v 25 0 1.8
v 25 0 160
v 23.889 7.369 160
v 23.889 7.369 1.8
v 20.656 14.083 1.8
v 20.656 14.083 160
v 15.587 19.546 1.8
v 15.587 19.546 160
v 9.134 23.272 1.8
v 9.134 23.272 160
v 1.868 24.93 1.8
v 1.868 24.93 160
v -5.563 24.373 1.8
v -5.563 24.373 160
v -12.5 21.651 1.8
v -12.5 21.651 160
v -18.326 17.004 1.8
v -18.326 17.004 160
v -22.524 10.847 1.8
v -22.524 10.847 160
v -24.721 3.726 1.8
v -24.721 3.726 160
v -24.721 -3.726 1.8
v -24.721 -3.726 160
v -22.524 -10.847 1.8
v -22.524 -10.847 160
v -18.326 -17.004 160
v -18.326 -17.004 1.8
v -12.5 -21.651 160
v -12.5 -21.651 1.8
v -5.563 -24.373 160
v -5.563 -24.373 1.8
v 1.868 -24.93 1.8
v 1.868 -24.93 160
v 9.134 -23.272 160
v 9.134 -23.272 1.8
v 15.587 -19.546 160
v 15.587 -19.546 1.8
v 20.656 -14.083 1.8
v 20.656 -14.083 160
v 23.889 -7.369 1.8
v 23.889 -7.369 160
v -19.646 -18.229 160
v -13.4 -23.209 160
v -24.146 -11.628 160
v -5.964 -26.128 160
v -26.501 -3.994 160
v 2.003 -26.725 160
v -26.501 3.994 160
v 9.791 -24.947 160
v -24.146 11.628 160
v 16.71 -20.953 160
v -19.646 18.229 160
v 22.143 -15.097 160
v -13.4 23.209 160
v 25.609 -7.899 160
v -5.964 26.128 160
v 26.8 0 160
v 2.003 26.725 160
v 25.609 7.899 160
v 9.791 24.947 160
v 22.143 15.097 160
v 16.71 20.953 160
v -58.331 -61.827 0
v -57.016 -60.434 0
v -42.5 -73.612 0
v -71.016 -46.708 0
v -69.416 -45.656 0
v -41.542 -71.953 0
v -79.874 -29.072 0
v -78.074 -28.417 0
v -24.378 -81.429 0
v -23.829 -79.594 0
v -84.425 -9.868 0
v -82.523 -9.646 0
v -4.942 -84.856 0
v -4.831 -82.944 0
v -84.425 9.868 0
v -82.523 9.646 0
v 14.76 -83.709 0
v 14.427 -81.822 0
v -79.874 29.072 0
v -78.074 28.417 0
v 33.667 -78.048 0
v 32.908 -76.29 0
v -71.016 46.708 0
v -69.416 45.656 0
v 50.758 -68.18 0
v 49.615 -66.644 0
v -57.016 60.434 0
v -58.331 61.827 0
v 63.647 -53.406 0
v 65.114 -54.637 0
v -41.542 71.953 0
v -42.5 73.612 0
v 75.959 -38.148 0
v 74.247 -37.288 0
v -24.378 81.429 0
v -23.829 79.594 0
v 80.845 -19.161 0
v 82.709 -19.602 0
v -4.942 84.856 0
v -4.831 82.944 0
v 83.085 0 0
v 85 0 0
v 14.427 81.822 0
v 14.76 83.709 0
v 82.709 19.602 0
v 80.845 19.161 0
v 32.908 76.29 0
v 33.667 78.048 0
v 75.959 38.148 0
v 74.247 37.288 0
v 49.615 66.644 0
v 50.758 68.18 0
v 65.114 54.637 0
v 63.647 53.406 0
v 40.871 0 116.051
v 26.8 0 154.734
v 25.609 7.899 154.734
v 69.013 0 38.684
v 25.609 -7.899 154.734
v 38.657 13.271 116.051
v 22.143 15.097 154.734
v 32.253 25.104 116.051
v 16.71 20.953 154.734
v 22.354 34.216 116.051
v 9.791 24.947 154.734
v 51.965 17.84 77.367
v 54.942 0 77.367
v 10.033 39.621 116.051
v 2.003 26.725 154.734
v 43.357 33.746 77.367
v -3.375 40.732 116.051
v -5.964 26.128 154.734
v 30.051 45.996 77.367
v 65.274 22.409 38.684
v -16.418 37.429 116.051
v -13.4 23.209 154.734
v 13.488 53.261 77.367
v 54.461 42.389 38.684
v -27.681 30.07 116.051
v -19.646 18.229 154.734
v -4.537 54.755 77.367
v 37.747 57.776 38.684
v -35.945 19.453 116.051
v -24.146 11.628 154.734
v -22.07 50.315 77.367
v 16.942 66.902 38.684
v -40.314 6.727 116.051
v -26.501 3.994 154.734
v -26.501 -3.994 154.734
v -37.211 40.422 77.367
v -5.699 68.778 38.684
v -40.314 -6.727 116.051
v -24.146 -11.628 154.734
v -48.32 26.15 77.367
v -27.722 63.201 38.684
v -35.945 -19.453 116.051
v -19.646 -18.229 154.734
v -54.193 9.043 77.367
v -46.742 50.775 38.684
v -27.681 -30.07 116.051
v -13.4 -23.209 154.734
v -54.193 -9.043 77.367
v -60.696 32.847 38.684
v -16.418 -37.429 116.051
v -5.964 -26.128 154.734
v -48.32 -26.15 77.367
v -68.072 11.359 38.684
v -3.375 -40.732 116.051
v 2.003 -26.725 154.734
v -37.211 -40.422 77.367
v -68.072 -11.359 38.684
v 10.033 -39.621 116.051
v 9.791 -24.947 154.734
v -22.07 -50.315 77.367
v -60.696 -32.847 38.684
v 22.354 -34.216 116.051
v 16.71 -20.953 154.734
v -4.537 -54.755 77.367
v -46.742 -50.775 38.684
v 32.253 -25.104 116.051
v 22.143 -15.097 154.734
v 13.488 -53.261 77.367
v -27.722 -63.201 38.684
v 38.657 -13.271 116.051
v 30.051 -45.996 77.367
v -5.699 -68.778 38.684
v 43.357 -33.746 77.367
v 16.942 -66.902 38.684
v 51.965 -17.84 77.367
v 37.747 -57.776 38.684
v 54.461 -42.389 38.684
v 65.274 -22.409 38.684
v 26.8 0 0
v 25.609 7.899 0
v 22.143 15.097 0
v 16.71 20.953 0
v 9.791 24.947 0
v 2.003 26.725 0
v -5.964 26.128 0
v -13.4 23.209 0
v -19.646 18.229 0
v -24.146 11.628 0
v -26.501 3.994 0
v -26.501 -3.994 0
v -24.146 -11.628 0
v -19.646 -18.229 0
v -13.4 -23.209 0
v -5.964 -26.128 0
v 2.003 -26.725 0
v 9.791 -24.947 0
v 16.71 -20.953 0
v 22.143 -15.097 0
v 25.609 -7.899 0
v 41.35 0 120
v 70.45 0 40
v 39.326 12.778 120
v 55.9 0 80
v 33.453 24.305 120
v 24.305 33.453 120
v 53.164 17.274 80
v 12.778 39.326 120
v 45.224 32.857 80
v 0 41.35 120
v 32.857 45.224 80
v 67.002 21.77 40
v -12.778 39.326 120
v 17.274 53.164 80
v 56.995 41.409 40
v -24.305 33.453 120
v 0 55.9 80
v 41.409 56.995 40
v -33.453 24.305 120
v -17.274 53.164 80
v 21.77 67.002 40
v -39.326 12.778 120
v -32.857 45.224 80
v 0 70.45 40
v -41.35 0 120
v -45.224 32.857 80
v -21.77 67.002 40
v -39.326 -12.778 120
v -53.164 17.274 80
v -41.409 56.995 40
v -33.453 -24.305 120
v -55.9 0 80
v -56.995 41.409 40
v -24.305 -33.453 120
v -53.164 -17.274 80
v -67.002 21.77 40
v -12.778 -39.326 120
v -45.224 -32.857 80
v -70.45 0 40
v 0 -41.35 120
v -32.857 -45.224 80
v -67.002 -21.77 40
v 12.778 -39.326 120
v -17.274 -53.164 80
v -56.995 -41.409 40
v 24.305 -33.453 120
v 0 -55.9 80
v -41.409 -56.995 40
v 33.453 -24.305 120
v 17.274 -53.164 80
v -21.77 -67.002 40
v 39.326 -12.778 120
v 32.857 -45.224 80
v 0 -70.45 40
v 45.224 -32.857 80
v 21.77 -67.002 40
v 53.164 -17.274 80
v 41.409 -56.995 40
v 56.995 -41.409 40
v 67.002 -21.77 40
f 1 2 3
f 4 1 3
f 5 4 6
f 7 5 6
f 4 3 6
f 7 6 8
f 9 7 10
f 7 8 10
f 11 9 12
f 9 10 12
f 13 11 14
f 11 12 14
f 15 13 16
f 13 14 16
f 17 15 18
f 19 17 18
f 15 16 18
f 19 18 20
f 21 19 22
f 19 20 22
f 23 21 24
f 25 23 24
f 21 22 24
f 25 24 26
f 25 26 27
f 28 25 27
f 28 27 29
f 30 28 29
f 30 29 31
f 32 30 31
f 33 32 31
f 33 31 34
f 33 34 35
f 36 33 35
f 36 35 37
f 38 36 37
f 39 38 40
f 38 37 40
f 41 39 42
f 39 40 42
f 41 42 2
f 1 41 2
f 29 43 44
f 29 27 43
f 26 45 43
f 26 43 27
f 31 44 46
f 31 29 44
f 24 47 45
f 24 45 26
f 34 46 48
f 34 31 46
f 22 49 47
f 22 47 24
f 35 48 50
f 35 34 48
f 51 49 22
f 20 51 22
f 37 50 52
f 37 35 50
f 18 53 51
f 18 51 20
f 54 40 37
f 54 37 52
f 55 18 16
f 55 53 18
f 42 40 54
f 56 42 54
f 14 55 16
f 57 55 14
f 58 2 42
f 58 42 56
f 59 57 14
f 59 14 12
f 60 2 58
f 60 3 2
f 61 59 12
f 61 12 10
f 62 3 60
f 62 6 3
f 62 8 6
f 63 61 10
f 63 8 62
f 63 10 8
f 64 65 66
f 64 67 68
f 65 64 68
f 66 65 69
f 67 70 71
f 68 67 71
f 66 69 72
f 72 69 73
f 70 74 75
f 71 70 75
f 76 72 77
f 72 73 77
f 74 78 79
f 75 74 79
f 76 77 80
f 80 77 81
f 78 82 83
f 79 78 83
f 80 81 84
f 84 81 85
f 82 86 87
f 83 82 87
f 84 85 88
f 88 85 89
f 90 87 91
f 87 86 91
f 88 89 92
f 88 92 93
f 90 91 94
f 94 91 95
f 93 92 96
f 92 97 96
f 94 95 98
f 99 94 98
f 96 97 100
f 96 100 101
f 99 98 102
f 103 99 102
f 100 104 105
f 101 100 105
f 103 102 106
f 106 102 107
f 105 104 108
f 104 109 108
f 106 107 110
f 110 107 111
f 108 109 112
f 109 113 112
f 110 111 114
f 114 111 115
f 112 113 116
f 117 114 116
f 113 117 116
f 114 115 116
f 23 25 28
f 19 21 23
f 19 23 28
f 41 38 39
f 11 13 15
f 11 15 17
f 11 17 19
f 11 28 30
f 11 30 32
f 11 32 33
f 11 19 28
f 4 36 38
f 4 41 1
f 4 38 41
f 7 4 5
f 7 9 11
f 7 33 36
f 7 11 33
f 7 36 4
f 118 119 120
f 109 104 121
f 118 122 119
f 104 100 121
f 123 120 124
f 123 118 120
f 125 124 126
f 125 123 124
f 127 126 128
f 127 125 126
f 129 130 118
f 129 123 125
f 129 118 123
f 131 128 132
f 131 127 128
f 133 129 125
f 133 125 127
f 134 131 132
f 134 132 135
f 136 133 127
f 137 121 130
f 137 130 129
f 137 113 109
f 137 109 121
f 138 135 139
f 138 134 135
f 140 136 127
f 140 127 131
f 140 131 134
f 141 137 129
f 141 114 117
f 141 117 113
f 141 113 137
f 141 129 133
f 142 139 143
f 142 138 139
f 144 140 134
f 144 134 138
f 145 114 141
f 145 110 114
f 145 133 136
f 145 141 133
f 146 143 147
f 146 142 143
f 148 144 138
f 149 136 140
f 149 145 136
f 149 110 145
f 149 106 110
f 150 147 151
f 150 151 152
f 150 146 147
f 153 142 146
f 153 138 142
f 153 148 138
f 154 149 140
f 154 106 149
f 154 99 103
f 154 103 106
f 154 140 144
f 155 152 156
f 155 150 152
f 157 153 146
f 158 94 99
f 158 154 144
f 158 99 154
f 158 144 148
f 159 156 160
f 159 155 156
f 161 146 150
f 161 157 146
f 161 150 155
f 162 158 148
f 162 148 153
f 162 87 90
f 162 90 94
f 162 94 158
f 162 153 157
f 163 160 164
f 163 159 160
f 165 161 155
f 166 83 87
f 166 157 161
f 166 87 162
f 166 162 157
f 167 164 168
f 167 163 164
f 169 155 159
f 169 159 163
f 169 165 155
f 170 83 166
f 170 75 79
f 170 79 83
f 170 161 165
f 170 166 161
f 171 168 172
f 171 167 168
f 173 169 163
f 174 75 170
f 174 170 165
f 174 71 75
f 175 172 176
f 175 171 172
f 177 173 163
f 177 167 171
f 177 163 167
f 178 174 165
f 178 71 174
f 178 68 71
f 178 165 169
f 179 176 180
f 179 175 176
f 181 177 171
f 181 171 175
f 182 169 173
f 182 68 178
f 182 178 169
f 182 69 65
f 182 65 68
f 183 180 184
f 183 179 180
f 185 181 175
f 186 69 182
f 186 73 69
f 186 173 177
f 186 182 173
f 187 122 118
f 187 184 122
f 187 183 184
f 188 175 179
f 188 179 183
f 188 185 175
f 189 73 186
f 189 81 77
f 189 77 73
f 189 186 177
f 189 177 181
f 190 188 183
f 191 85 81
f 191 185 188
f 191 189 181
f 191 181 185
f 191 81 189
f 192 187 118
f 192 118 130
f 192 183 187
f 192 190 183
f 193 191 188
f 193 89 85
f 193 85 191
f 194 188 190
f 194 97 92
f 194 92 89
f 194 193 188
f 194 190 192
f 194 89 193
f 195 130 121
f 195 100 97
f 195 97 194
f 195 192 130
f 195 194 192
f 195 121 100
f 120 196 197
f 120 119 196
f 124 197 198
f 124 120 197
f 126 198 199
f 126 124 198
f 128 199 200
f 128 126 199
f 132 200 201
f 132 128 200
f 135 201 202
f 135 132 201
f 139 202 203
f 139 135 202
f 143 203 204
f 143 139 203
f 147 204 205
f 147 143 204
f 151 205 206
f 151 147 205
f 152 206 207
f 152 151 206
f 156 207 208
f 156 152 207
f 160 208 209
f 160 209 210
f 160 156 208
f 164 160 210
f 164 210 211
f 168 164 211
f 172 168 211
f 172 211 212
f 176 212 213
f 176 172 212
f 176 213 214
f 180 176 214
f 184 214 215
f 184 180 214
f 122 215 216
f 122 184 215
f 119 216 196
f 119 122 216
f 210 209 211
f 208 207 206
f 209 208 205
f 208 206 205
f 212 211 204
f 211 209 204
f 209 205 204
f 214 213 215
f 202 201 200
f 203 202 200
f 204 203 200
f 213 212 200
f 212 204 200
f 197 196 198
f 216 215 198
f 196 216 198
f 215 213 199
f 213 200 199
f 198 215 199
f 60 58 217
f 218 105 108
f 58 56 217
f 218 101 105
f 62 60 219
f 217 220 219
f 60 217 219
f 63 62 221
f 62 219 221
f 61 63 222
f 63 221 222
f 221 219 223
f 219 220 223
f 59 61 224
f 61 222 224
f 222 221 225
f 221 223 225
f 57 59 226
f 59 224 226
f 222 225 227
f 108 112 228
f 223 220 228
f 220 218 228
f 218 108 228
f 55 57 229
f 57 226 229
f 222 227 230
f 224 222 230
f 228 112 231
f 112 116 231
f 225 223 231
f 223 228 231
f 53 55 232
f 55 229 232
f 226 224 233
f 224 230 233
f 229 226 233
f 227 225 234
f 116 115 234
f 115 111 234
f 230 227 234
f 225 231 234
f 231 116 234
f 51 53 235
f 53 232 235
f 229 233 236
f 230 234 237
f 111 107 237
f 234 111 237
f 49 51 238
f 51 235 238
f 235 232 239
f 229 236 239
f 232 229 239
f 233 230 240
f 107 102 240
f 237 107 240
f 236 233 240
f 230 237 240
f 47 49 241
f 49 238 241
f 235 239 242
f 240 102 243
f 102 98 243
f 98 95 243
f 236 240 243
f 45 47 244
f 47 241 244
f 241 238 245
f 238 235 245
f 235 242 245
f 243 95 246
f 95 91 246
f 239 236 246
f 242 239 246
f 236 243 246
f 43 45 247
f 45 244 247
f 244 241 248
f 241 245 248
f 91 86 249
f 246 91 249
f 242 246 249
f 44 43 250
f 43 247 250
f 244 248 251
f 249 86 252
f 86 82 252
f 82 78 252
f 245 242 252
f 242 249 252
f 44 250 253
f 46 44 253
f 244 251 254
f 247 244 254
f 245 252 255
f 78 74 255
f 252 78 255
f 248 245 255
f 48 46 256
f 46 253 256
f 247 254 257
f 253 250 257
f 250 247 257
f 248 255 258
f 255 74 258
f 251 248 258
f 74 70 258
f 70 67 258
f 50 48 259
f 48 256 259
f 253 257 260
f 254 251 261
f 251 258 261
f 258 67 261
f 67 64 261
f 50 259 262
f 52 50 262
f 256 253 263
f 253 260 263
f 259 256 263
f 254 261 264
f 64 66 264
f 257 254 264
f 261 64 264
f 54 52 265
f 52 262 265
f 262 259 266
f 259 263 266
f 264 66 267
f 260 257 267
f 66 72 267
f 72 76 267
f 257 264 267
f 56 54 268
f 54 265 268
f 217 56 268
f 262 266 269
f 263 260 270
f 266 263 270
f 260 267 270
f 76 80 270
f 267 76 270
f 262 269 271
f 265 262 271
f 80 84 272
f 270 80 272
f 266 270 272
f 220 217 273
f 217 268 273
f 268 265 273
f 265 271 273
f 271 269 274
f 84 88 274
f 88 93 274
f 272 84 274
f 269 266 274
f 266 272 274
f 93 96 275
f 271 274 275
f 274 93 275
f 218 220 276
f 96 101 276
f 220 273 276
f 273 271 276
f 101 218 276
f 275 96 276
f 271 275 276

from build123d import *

# Parameters (mm, degrees)
F2_R     = 26.8
F0_R     = 85
F4_R     = 25
F5_DEPTH = 158.2
F6_T     = -1.8


with BuildPart() as f3:
    # F2 (on offset) → F3 section 0
    with BuildSketch(Plane.XY.offset(160)):
        Circle(F2_R)
    # F0 (on Top) → F3 section 1
    with BuildSketch(Plane.XY):
        Circle(F0_R)
    loft()

    # F4 (on offset) → F5 (cut)
    with BuildSketch(Plane.XY.offset(160)):
        Circle(F4_R)
    extrude(amount=-F5_DEPTH, mode=Mode.SUBTRACT)

    # F6
    f6_openings = [f3.faces().sort_by_distance(p)[0] for p in [
        (0, 0, 0),
    ]]
    offset(amount=F6_T, openings=f6_openings, kind=Kind.INTERSECTION)


solid = f3.part
